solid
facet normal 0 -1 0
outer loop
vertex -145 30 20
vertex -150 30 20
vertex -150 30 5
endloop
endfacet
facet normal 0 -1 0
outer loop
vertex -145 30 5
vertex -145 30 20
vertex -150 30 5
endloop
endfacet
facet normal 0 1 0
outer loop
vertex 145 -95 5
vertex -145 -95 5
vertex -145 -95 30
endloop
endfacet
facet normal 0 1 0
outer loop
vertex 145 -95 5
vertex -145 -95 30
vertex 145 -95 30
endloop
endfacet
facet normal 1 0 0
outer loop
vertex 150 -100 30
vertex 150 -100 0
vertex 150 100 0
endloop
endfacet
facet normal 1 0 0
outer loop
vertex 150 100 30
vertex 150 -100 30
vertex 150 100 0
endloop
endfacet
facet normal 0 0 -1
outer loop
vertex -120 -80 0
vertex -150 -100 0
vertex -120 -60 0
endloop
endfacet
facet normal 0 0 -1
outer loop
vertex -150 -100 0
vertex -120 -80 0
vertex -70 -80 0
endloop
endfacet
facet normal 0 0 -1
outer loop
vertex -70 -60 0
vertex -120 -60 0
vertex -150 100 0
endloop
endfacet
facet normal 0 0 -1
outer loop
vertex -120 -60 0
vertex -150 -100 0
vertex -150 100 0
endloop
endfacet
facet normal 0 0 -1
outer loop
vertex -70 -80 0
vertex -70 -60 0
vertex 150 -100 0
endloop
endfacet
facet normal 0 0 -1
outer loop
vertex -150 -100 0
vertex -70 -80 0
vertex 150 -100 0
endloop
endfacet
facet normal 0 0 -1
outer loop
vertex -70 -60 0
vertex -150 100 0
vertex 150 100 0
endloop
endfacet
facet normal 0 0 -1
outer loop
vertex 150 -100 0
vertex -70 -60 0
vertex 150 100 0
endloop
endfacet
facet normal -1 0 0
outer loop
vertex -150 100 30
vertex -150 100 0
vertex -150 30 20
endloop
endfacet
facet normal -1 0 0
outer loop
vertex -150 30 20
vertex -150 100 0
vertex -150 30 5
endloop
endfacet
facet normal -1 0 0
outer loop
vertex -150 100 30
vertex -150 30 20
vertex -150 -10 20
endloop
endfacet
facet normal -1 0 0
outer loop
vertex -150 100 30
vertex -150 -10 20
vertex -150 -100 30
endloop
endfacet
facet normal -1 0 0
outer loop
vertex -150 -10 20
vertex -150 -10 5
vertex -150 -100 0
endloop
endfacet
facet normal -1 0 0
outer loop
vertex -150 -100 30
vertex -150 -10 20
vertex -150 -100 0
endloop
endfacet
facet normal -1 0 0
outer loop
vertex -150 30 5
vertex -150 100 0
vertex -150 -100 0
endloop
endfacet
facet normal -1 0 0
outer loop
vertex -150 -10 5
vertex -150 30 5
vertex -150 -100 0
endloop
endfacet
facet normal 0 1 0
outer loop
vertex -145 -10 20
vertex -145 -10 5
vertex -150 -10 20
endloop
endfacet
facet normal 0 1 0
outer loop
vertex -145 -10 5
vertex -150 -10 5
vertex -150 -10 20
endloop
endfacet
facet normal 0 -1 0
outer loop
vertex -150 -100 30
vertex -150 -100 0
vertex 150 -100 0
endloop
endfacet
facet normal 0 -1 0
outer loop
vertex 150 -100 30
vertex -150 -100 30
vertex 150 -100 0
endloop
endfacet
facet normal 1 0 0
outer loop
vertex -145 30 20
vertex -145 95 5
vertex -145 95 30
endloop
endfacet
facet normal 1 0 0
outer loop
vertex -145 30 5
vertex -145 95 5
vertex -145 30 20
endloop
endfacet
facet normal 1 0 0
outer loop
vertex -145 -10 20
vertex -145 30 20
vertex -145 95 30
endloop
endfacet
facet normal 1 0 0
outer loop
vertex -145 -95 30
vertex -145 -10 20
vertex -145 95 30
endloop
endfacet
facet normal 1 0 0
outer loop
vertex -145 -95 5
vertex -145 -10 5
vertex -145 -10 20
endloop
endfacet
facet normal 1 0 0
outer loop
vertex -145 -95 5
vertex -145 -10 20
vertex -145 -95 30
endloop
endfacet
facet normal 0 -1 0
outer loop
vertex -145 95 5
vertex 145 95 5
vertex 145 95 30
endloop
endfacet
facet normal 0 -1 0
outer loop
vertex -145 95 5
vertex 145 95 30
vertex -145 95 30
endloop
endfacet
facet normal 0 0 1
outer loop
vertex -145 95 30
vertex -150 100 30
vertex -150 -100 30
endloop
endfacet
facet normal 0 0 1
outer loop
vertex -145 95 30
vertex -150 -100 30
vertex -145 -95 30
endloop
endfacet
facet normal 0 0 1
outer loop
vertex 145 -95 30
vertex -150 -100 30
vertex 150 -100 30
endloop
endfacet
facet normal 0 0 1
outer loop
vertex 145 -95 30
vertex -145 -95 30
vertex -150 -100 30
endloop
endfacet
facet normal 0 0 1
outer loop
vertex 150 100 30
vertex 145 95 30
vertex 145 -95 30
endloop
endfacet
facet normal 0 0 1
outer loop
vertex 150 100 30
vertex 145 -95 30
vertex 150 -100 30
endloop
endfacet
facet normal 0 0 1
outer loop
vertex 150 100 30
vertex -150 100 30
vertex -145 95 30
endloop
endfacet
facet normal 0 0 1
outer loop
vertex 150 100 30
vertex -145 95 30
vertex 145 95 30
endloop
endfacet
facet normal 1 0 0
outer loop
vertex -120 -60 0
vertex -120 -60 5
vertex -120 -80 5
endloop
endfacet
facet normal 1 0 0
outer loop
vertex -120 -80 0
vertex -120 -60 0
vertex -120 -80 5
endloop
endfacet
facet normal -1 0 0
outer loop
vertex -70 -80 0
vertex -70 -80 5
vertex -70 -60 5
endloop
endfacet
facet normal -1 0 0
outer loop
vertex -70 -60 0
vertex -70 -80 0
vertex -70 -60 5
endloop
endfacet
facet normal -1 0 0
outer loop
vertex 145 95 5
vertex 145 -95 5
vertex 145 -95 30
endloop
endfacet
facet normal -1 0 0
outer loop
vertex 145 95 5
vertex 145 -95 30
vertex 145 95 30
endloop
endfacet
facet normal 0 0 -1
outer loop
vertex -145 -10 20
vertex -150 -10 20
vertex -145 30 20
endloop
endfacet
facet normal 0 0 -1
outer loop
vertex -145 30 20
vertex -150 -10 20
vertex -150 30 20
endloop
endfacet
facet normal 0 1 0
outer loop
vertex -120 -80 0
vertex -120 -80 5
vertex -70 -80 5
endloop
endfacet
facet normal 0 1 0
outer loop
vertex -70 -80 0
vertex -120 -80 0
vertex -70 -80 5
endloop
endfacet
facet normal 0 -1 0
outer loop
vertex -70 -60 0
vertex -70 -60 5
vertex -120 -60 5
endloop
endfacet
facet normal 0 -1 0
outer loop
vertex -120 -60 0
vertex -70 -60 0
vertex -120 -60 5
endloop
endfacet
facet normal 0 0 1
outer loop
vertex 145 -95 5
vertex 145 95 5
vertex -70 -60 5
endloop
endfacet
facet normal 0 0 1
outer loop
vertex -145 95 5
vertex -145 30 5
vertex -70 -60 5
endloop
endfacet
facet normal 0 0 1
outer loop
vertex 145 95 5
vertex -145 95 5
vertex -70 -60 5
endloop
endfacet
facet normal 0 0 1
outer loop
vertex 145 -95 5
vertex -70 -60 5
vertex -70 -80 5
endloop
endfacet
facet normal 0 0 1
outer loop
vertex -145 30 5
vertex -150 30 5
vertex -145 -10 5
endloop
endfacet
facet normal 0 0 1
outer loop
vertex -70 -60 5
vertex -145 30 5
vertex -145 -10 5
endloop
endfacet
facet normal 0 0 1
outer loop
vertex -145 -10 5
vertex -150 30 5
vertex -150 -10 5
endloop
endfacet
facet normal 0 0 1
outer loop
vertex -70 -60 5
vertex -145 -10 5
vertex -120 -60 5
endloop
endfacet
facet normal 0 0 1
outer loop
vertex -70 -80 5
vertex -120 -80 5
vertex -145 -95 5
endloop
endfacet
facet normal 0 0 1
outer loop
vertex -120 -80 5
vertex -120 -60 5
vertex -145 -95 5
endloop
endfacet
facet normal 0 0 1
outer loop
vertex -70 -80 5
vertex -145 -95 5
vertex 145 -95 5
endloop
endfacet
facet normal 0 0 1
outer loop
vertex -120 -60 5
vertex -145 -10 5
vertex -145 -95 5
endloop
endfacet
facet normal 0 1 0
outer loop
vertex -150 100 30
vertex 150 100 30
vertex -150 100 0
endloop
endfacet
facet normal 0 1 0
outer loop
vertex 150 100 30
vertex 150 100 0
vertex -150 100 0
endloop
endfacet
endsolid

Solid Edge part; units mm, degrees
sketch "Sketch1" plane through (0, 0, 0) normal (0, 0, 1) x (1, 0, 0)
  line L0 (-150, -100) -> (150, -100)
  line L1 (150, -100) -> (150, 100)
  line L2 (150, 100) -> (-150, 100)
  line L3 (-150, 100) -> (-150, -100)
  dimension "D1" = 200
  dimension "D2" = 300
extrude "Protrusion1" add sketch "Sketch1" along normal blind 5
sketch "Sketch2" plane through (0, 0, 5) normal (0, 0, 1) x (1, 0, 0)
  line L0 (-120, -80) -> (-70, -80)
  line L1 (-70, -80) -> (-70, -60)
  line L2 (-70, -60) -> (-120, -60)
  line L3 (-120, -60) -> (-120, -80)
  dimension "D1" = 30
  dimension "D2" = 20
  dimension "D3" = 50
  dimension "D4" = 20
extrude "Cutout1" cut sketch "Sketch2" against normal up to next
sketch "Sketch3" plane through (0, 0, 5) normal (0, 0, 1) x (1, 0, 0)
  line L0 (-145, -95) -> (145, -95)
  line L1 (145, -95) -> (145, 95)
  line L2 (145, 95) -> (-145, 95)
  line L3 (-145, 95) -> (-145, -95)
  line L4 (-150, -100) -> (150, -100)
  line L5 (150, -100) -> (150, 100)
  line L6 (150, 100) -> (-150, 100)
  line L7 (-150, 100) -> (-150, -100)
extrude "ExtrudedProtrusion_2" add sketch "Sketch3" along normal blind 25
sketch "Sketch4" plane through (-150, 0, 15) normal (-1, 0, 0) x (0, -1, 0)
  line L0 (-30, -10) -> (10, -10)
  line L1 (10, -10) -> (10, 5)
  line L2 (10, 5) -> (-30, 5)
  line L3 (-30, 5) -> (-30, -10)
  dimension "D1" = 15
  dimension "D2" = 40
  dimension "D3" = 5
  dimension "D4" = 90
extrude "ExtrudedCutout_2" cut sketch "Sketch4" against normal blind 5
